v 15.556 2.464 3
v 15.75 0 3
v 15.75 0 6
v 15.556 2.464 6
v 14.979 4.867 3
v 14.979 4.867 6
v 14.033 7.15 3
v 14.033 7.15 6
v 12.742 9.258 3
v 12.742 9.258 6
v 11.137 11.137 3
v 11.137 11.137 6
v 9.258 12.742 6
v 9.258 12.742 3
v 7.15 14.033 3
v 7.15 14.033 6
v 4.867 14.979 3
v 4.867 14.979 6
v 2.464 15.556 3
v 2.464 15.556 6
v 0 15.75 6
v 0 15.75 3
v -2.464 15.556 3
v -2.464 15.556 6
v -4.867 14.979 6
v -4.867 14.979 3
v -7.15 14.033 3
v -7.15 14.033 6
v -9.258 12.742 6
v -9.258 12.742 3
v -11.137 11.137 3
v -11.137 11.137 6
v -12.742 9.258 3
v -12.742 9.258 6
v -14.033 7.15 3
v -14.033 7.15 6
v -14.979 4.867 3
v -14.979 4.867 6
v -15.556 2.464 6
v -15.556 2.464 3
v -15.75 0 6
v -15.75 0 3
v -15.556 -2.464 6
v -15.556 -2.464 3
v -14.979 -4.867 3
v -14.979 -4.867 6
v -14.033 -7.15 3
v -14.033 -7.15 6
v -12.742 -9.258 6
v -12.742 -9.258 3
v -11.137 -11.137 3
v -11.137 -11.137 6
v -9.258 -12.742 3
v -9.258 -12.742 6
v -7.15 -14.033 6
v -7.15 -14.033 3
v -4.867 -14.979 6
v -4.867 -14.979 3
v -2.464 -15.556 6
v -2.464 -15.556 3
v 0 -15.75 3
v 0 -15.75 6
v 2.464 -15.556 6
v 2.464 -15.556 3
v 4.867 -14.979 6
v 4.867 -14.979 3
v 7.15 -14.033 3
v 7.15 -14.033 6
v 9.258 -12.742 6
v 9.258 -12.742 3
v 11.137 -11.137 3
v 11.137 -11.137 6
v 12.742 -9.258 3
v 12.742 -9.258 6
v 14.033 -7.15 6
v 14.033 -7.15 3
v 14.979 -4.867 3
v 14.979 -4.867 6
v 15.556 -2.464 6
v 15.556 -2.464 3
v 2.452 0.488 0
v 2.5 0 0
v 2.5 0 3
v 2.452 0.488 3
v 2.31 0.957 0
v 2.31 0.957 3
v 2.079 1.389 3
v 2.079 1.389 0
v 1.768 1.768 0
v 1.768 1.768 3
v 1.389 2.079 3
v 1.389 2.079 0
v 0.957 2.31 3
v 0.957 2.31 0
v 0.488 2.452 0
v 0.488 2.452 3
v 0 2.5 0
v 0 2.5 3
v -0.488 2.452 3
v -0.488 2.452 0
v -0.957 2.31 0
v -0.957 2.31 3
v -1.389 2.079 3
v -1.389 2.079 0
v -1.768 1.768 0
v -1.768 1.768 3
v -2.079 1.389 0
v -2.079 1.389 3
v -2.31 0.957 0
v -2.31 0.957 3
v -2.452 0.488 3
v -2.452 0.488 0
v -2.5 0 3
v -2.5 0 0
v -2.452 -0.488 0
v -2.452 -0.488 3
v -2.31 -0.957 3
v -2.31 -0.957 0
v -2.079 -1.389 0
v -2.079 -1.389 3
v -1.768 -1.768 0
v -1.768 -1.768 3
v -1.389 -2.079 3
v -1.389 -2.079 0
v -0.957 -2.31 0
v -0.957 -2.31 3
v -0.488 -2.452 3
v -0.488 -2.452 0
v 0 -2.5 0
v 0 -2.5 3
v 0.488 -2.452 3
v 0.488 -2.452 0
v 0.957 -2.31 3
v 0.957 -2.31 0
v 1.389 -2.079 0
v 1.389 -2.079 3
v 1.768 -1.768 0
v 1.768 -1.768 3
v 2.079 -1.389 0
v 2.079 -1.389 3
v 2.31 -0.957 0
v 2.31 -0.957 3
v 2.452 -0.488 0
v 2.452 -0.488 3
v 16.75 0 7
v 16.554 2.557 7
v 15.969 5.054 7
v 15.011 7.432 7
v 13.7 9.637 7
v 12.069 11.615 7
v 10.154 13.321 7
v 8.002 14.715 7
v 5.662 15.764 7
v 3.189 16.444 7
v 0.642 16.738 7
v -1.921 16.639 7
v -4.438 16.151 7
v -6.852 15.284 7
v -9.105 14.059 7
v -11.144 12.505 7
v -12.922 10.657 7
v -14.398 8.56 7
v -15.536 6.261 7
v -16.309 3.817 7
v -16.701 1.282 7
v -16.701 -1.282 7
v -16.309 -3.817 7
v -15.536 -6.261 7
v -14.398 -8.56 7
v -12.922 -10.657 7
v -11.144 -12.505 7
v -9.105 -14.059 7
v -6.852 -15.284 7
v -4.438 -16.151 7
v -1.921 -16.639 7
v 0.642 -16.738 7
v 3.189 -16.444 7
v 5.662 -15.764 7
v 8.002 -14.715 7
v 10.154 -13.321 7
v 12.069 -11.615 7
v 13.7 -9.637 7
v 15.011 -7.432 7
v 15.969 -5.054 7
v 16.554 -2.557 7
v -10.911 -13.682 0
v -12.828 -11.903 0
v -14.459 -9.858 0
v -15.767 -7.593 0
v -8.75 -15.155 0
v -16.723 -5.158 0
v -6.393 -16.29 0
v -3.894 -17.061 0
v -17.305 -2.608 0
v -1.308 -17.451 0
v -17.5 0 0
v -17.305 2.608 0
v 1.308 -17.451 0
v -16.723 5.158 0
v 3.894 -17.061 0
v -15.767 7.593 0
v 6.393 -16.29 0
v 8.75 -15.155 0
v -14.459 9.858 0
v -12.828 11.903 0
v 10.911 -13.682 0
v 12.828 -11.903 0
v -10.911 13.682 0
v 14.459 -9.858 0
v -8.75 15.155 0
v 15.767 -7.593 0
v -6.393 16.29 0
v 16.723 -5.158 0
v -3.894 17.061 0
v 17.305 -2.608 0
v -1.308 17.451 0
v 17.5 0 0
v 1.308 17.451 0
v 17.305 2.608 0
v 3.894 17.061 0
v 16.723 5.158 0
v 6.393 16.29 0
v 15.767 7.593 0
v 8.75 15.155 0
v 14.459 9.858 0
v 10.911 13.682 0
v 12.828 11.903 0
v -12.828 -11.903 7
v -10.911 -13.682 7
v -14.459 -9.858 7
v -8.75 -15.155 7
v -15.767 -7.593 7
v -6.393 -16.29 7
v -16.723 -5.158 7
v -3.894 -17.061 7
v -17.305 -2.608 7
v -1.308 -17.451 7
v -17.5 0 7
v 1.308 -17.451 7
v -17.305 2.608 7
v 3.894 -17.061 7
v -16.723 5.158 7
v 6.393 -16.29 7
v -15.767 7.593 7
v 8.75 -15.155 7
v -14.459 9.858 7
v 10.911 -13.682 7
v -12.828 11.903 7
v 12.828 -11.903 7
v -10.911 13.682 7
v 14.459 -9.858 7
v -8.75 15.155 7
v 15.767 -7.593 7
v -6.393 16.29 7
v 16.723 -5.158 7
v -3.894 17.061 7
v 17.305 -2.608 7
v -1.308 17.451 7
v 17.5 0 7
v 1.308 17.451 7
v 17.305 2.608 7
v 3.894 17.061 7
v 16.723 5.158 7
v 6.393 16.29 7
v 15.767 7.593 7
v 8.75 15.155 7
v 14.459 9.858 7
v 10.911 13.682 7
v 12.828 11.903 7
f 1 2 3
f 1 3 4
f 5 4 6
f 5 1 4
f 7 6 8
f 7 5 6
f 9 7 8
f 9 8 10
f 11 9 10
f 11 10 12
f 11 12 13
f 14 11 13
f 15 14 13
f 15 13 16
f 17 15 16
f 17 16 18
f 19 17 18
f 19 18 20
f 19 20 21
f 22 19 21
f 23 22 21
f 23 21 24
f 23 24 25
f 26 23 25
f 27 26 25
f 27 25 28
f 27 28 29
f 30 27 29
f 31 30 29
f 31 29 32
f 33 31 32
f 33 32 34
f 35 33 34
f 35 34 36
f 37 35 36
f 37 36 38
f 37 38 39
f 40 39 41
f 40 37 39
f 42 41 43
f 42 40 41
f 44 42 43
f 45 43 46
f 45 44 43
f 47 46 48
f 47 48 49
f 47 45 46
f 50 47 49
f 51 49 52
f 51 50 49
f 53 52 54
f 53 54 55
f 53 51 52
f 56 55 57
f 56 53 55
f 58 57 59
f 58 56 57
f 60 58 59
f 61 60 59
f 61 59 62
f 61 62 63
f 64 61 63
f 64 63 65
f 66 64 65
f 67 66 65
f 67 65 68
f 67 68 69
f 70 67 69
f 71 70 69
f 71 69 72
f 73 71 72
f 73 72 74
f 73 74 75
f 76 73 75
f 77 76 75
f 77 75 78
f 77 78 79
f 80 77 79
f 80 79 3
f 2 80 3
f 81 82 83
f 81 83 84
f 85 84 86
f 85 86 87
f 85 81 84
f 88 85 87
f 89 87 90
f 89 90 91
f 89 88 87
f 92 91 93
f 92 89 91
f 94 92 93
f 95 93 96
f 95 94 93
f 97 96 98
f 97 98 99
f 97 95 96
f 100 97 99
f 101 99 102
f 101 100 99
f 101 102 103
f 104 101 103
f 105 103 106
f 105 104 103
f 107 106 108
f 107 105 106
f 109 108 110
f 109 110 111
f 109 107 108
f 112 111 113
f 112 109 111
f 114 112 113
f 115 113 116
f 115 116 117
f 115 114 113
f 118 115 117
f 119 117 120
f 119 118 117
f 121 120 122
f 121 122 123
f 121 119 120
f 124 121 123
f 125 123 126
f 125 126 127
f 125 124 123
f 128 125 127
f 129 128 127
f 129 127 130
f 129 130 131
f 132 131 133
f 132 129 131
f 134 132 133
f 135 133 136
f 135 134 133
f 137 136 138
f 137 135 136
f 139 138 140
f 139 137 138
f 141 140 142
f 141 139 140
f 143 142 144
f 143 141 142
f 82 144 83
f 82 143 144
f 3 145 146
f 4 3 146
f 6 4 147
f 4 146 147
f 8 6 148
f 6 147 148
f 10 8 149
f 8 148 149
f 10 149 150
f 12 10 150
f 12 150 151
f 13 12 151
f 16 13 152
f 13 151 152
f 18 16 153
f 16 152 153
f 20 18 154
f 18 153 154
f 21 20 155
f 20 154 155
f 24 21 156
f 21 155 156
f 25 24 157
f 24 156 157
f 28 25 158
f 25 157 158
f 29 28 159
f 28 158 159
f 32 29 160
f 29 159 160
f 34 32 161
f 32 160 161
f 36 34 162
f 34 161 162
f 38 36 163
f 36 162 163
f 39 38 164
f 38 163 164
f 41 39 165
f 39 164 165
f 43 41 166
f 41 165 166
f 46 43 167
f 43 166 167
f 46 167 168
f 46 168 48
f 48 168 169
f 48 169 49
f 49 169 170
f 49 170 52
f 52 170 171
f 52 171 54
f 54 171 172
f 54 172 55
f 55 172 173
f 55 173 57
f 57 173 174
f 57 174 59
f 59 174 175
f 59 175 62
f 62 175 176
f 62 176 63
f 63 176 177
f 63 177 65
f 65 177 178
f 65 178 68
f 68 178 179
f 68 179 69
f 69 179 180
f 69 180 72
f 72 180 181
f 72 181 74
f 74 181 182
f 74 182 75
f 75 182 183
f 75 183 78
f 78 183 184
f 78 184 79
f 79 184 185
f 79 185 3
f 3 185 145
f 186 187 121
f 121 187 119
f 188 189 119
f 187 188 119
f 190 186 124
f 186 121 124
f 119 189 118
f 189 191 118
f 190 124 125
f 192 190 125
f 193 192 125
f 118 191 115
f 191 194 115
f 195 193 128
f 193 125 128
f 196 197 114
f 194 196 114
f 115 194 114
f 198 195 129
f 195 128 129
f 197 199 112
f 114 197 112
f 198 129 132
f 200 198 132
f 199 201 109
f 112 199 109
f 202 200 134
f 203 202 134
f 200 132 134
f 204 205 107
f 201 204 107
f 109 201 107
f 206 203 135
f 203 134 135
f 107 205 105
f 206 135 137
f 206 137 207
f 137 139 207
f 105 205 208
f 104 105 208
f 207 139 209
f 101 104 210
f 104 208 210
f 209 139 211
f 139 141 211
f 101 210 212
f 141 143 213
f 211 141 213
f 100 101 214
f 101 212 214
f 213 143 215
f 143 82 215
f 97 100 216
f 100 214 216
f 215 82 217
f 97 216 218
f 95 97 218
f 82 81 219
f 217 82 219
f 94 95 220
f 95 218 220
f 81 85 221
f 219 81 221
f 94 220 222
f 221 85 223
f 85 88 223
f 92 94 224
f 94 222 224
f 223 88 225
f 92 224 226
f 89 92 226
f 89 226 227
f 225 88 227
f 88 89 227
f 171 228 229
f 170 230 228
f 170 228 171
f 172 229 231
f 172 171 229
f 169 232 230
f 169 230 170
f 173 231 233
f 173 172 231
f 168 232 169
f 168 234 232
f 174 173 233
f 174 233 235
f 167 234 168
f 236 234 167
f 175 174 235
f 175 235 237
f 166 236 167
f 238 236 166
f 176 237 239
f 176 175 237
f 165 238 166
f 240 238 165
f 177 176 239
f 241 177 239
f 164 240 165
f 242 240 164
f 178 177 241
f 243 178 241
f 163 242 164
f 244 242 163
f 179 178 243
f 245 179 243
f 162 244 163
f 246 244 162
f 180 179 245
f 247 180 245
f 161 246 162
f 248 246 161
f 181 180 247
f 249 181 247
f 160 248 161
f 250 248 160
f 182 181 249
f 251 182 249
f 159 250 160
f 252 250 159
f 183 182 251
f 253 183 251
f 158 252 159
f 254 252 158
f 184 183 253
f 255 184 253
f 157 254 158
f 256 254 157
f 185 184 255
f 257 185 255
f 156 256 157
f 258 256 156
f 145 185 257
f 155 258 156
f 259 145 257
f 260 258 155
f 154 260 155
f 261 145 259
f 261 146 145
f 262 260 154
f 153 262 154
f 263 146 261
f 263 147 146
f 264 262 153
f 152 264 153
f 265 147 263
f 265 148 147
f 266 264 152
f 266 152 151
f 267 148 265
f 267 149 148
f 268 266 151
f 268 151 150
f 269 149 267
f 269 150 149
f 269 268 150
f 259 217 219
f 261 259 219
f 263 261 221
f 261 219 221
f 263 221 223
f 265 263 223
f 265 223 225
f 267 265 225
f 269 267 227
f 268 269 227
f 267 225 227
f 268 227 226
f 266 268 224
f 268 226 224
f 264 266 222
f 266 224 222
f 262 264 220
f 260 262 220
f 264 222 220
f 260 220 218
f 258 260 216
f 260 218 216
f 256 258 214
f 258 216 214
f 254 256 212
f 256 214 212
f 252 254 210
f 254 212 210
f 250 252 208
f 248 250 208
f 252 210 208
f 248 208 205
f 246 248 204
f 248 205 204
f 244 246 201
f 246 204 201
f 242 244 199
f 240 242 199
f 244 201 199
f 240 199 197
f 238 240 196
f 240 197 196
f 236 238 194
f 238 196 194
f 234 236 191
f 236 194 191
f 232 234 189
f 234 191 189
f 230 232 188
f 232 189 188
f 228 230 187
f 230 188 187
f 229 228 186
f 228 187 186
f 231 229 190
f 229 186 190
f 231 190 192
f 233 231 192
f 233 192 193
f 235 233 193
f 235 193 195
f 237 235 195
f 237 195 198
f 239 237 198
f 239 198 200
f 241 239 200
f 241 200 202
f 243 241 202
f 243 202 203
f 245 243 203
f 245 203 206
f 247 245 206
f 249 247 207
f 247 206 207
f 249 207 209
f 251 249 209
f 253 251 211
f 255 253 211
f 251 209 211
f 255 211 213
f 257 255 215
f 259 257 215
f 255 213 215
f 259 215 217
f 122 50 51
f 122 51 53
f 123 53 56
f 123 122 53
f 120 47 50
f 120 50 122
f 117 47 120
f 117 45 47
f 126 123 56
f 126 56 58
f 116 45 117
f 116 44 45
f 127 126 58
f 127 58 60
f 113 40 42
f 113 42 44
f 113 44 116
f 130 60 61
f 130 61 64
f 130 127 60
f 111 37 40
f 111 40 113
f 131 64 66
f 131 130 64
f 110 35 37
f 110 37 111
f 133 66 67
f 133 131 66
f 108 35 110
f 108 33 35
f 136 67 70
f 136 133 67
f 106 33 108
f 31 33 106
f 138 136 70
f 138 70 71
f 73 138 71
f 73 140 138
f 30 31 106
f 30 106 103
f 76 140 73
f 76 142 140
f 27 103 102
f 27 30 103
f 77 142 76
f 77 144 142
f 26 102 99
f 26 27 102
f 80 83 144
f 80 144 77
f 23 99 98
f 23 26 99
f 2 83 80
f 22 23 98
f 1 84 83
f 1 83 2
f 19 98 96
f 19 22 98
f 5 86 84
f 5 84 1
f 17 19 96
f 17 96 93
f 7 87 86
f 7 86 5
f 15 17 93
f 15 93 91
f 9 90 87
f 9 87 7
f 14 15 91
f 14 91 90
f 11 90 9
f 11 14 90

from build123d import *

# Parameters (mm, degrees)
F0_R     = 17.5
F0_R_2   = 15.75
F1_DEPTH = 7
F0_R_3   = 2.5
F2_DEPTH = 3
F3_SIZE  = 1


# Not quite as in the source:
# - a feature names something its author has since deleted; it is built from what else it names


with BuildPart() as f1:
    # F0 (on Top) → F1 (new body)
    with BuildSketch(Plane.XY):
        Circle(F0_R)
        Circle(F0_R_2, mode=Mode.SUBTRACT)
    extrude(amount=F1_DEPTH)

    # F0 (on Top) → F2 (join)
    with BuildSketch(Plane.XY):
        Circle(F0_R_2)
        Circle(F0_R_3, mode=Mode.SUBTRACT)
    extrude(amount=F2_DEPTH)

    # F3
    f3_edges = [f1.edges().sort_by_distance(p)[0] for p in [
        (-15.75, 0, 7),
    ]]
    chamfer(f3_edges, length=F3_SIZE)


solid = f1.part
